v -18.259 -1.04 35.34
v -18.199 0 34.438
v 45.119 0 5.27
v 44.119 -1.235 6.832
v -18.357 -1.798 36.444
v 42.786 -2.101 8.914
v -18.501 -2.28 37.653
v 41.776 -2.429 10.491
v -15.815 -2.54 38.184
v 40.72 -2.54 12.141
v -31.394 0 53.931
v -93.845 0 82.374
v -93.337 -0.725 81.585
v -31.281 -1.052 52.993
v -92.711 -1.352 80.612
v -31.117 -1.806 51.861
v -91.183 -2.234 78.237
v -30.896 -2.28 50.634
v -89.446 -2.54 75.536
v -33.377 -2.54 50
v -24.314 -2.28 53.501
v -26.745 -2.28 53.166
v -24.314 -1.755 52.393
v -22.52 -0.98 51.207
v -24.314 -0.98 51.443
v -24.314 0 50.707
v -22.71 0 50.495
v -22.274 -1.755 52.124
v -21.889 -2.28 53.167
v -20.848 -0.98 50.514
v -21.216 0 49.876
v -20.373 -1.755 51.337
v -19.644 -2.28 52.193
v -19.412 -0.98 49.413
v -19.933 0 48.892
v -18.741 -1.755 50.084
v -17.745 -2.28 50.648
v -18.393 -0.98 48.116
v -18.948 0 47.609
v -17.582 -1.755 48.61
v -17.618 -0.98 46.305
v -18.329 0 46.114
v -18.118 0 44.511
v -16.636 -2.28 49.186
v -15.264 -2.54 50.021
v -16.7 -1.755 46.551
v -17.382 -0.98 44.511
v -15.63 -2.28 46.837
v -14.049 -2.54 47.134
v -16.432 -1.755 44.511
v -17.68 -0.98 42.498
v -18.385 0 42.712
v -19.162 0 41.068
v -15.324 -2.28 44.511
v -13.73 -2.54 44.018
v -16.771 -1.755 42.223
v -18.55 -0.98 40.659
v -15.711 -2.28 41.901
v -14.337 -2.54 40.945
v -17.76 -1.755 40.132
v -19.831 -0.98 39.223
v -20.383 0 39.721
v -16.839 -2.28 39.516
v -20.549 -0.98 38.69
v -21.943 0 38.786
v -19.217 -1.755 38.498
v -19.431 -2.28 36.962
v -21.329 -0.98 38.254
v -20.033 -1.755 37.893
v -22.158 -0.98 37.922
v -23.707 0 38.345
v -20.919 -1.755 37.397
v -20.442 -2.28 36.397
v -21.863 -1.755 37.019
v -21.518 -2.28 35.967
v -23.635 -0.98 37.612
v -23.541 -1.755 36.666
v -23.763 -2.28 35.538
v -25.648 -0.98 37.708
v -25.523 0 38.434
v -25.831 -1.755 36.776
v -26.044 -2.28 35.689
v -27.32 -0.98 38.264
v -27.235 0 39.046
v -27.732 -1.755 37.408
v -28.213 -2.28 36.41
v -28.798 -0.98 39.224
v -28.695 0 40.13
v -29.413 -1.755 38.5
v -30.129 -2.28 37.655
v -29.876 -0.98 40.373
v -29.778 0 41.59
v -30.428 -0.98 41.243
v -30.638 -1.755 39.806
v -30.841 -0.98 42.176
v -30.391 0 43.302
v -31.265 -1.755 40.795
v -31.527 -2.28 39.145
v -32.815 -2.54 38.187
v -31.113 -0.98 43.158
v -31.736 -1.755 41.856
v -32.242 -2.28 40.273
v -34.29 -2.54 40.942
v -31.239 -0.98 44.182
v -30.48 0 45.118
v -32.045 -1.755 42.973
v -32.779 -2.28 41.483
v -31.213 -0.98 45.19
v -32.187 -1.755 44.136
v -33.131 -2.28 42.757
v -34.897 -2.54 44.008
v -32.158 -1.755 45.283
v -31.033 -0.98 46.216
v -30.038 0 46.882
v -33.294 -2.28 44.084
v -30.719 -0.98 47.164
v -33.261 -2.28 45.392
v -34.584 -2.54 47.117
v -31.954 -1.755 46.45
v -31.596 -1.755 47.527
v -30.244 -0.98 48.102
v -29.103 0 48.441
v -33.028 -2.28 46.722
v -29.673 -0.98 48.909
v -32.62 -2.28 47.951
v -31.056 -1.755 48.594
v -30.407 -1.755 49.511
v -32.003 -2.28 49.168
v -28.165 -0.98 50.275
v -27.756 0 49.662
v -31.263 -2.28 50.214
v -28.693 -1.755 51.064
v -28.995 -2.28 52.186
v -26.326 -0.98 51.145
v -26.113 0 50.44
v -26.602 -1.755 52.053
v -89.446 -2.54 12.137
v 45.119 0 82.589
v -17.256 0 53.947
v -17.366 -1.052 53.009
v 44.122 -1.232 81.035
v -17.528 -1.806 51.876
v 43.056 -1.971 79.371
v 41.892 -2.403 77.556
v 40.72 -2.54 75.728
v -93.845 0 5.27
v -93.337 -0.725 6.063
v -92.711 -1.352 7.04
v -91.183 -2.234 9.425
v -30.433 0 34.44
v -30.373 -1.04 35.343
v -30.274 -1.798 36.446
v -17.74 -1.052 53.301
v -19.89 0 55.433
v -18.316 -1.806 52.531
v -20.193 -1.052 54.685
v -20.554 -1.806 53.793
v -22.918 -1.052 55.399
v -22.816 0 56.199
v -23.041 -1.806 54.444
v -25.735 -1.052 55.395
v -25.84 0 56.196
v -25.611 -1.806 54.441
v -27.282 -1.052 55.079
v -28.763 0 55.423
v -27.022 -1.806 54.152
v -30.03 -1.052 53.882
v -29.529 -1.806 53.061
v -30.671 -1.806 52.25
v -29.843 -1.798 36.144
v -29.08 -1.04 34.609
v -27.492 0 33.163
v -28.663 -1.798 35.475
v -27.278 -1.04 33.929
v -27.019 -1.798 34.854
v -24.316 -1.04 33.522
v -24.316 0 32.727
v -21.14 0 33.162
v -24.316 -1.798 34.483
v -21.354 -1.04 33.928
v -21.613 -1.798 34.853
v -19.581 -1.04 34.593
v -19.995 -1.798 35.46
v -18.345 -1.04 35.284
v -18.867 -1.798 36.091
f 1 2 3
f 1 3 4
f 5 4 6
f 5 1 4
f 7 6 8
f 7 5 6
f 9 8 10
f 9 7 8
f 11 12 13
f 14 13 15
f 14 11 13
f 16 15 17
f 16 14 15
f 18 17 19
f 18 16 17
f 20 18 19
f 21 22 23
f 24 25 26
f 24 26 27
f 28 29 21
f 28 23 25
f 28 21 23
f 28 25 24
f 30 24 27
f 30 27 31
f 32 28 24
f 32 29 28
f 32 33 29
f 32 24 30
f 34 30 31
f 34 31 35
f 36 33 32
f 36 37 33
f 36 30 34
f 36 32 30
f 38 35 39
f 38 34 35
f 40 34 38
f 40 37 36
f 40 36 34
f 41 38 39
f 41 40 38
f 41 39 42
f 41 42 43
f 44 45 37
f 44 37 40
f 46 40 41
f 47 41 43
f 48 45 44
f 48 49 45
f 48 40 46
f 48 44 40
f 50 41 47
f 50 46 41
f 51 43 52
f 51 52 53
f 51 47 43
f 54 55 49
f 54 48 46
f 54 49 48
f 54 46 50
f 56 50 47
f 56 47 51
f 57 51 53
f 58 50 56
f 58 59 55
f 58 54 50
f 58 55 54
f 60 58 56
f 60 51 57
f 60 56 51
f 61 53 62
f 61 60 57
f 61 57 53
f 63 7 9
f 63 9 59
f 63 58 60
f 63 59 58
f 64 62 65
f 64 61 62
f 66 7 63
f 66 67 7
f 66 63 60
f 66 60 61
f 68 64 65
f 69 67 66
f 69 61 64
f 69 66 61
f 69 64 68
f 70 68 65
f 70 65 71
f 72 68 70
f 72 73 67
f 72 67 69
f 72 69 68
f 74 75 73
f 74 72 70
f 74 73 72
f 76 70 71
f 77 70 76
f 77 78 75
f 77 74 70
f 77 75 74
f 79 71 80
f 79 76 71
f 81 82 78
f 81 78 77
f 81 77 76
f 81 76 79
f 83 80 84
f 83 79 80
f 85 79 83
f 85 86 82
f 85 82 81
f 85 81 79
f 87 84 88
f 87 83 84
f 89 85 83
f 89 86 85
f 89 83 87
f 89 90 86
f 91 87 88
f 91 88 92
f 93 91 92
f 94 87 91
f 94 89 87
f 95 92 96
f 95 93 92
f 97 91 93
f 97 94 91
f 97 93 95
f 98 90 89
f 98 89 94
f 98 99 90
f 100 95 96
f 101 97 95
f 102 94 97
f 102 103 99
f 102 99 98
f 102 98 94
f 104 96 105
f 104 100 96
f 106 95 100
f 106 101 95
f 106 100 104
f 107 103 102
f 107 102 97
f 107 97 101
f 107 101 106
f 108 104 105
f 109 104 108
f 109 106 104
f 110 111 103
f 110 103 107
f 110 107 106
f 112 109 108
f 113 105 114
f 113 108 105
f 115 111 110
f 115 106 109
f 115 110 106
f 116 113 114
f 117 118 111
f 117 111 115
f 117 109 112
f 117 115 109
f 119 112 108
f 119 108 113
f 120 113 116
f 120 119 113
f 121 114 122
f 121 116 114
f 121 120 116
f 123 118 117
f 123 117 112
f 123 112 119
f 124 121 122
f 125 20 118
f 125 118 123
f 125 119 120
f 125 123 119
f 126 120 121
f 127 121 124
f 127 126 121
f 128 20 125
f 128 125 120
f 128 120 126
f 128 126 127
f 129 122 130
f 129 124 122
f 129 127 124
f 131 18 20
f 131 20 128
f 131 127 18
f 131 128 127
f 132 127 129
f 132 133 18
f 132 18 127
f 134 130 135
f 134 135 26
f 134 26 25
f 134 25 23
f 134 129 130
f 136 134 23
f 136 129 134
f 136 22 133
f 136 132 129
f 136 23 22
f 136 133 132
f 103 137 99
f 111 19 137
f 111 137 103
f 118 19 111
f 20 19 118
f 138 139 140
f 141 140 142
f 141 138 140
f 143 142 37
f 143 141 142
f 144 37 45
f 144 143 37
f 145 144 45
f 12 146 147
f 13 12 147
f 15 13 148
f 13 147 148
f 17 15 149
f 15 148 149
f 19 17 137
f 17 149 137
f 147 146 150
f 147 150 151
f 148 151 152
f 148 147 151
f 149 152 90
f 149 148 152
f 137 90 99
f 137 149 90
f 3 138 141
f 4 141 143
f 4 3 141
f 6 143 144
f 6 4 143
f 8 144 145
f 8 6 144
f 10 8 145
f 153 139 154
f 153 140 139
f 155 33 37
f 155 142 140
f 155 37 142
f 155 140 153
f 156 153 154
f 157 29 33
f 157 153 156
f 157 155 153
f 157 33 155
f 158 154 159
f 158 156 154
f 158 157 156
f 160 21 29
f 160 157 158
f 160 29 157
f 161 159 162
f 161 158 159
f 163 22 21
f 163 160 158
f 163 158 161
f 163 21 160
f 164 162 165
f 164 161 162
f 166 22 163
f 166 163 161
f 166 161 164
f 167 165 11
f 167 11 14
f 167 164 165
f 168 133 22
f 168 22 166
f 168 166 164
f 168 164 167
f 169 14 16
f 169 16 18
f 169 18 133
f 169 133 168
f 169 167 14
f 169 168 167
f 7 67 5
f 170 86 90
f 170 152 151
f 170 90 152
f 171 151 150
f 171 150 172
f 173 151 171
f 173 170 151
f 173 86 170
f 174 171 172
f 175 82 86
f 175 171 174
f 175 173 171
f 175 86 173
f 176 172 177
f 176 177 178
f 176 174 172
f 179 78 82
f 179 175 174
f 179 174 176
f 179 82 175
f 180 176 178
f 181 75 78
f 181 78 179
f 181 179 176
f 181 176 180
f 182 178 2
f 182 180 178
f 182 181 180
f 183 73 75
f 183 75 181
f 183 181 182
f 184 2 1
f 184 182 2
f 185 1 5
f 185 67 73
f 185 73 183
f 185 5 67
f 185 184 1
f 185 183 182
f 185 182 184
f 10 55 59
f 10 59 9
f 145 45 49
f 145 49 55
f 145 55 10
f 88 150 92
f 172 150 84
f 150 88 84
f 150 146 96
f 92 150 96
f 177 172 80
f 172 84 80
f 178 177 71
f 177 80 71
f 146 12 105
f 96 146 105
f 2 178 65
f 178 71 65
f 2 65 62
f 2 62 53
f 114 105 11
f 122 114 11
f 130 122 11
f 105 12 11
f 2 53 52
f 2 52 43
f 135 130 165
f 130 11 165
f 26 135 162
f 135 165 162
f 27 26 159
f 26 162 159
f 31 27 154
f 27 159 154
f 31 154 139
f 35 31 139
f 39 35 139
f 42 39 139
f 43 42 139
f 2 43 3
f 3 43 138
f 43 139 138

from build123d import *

# Parameters (mm, degrees)
F1_DEPTH     = 2.54
F2_T1_DEPTH  = 99.1010776341
F2_T3_DEPTH  = 99.3158813996
F2_T8_DEPTH  = 90.6208911446
F2_S9_R      = 11.7840069811
F2_T10_DEPTH = 49
F2_T14_DEPTH = 91.7966915257
F2_S15_R     = 11.7840069811
F2_T16_DEPTH = 49
F2_T20_ANGLE = 169.5184876271
F2_T26_ANGLE = 180.7013968541
F2_T32_DEPTH = 90.6339735213
F2_S33_R     = 11.7840069811
F2_T34_DEPTH = 49
F2_T38_DEPTH = 91.7098992775
F2_S39_R     = 11.7840069811
F2_T40_DEPTH = 49
F2_T47_DEPTH = 90.6208911446
F2_S48_R     = 11.7840069811
F2_T49_DEPTH = 49
F2_T52_ANGLE = 180.7013968541
F2_T60_DEPTH = 91.7966915257
F2_S61_R     = 11.7840069811
F2_T62_DEPTH = 49
F2_T65_ANGLE = 169.5184876271
F2_T73_ANGLE = 169.5184876271
F2_T78_DEPTH = 91.7098992775
F2_S79_R     = 11.7840069811
F2_T80_DEPTH = 49
F2_T86_DEPTH = 90.6339735213
F2_S87_R     = 11.7840069811
F2_T88_DEPTH = 49
F2_T91_ANGLE = 180.7013968541


# Not quite as in the source:
# - a fillet or chamfer that OpenCascade refuses, or shapes differently, is made with other operations: its cross-section is extruded or revolved along the edge and cut away or added


with BuildPart() as f1:
    # F0 (on Front) → F1 (new body)
    with BuildSketch(Plane.XZ):
        with BuildLine():
            Line((-31.3936966788, 53.9309575686), (-93.8453510125, 82.3742888697))
            Line((-93.8453510125, 82.3742888697), (-93.8453510125, 5.2702564917))
            Line((-93.8453510125, 5.2702564917), (-30.4330390113, 34.4399206311))
            ThreePointArc((-30.4330390113, 34.4399206311), (-36.0837561517, 43.9306053941), (-31.3936966788, 53.9309575686))
        make_face()
        with BuildLine():
            Line((-24.3140361377, 37.2546620127), (-30.4330390113, 34.4399206311))
            ThreePointArc((-30.4330390113, 34.4399206311), (-24.3162174043, 32.7266945746), (-18.1987619666, 34.4376560178))
            Line((-18.1987619666, 34.4376560178), (-24.3140361377, 37.2546620127))
        make_face()
        with BuildLine():
            ThreePointArc((-17.2562665131, 53.9473696458), (-24.3277161277, 56.2947003943), (-31.3936966788, 53.9309575686))
            Line((-31.3936966788, 53.9309575686), (-24.3140361377, 50.7065573118))
            Line((-24.3140361377, 50.7065573118), (-17.2562665131, 53.9473696458))
        make_face()
        with BuildLine():
            Line((-24.3140361377, 50.7065573118), (-31.3936966788, 53.9309575686))
            ThreePointArc((-31.3936966788, 53.9309575686), (-36.0837561517, 43.9306053941), (-30.4330390113, 34.4399206311))
            Line((-30.4330390113, 34.4399206311), (-24.3140361377, 37.2546620127))
            Line((-24.3140361377, 37.2546620127), (-18.1987619666, 34.4376560178))
            ThreePointArc((-18.1987619666, 34.4376560178), (-14.0445362947, 38.731411302), (-12.5300291567, 44.5107013538))
            ThreePointArc((-12.5300291567, 44.5107013538), (-13.7776319348, 49.7877276945), (-17.2562665131, 53.9473696458))
            Line((-17.2562665131, 53.9473696458), (-24.3140361377, 50.7065573118))
        make_face()
        with BuildLine():
            ThreePointArc((-18.1181801797, 44.5107013538), (-28.6951679009, 40.1295695906), (-24.3140361377, 50.7065573118))
            ThreePointArc((-24.3140361377, 50.7065573118), (-19.9329043745, 48.891833117), (-18.1181801797, 44.5107013538))
        make_face(mode=Mode.SUBTRACT)
        with BuildLine():
            Line((45.1190461185, 82.5890926352), (-17.2562665131, 53.9473696458))
            ThreePointArc((-17.2562665131, 53.9473696458), (-13.7776319348, 49.7877276945), (-12.5300291567, 44.5107013538))
            ThreePointArc((-12.5300291567, 44.5107013538), (-14.0445362947, 38.731411302), (-18.1987619666, 34.4376560178))
            Line((-18.1987619666, 34.4376560178), (45.1190461185, 5.2702564917))
            Line((45.1190461185, 5.2702564917), (45.1190461185, 82.5890926352))
        make_face()
    extrude(amount=F1_DEPTH)

    # F2: fillet of radius 5.08 on 9 edges, made by hand

    # F2_s2 → F2_t1 (cut)
    with BuildSketch(Plane.XY.offset(-5.7282661364)):
        with BuildLine():
            ThreePointArc((-93.8453510125, 0), (-91.9859419613, -1.8594090512), (-89.4459419613, -2.54))
            Line((-89.4459419613, -2.54), (-89.4459419613, -2.6416))
            Line((-89.4459419613, -2.6416), (-93.8453510125, -2.6416))
            Line((-93.8453510125, -2.6416), (-93.9469510125, -2.54))
            ThreePointArc((-93.9469510125, -2.54), (-93.9469510125, -1.27), (-93.9333391936, -0.0508))
            Line((-93.9333391936, -0.0508), (-93.8453510125, 0))
        make_face()
    extrude(amount=F2_T1_DEPTH, mode=Mode.SUBTRACT)

    # F2_s4 → F2_t3 (cut)
    with BuildSketch(Plane.XY.offset(-5.7282661364)):
        with BuildLine():
            ThreePointArc((45.1190461184, 0), (43.2596370672, -1.8594090512), (40.7196370672, -2.54))
            Line((40.7196370672, -2.54), (40.7196370672, -2.6416))
            Line((40.7196370672, -2.6416), (45.1190461185, -2.6416))
            Line((45.1190461185, -2.6416), (45.2206461185, -2.54))
            ThreePointArc((45.2206461185, -2.54), (45.2206461185, -1.27), (45.2070342995, -0.0508))
            Line((45.2070342995, -0.0508), (45.1190461184, 0))
        make_face()
    extrude(amount=F2_T3_DEPTH, mode=Mode.SUBTRACT)


with BuildPart() as f2_tool6:
    # F2_s7 → F2_t8 (new body)
    with BuildSketch(Plane(origin=(-36.3340032464, 0, 16.54816198), x_dir=(0, 1, 0), z_dir=(-0.9100576268, 0, 0.4144817437))):
        with BuildLine():
            ThreePointArc((0, -36.0681651183), (-1.8594090512, -34.2087560671), (-2.54, -31.6687560671))
            Line((-2.54, -31.6687560671), (-2.6416, -31.6687560671))
            Line((-2.6416, -31.6687560671), (-2.6416, -36.0681651183))
            Line((-2.6416, -36.0681651183), (-2.54, -36.1697651183))
            ThreePointArc((-2.54, -36.1697651183), (-1.27, -36.1697651183), (-0.0508, -36.1561532993))
            Line((-0.0508, -36.1561532993), (0, -36.0681651183))
        make_face()
    extrude(amount=F2_T8_DEPTH)

    # F2_s9 → F2_t10 (cut, symmetric)
    with BuildSketch(Plane.XZ.offset(1.3)):
        with Locations((-24.3140361377, 44.5107013538)):
            Circle(F2_S9_R)
    extrude(amount=F2_T10_DEPTH, both=True, mode=Mode.SUBTRACT)


with BuildPart() as f1_1:
    add(f1.part)

    # F2_t5: cut F2_tool6
    add(f2_tool6.part, mode=Mode.SUBTRACT)


with BuildPart() as f2_tool12:
    # F2_s13 → F2_t14 (new body)
    with BuildSketch(Plane(origin=(-85.4468499724, 0, -39.3055518212), x_dir=(0, 1, 0), z_dir=(0.9084904493, 0, 0.4179056155))):
        with BuildLine():
            ThreePointArc((0, 44.0064768695), (-1.8594090512, 45.8658859207), (-2.54, 48.4058859207))
            Line((-2.54, 48.4058859207), (-2.6416, 48.4058859207))
            Line((-2.6416, 48.4058859207), (-2.6416, 44.0064768695))
            Line((-2.6416, 44.0064768695), (-2.54, 43.9048768695))
            ThreePointArc((-2.54, 43.9048768695), (-1.27, 43.9048768695), (-0.0508, 43.9184886885))
            Line((-0.0508, 43.9184886885), (0, 44.0064768695))
        make_face()
    extrude(amount=F2_T14_DEPTH)

    # F2_s15 → F2_t16 (cut, symmetric)
    with BuildSketch(Plane.XZ.offset(1.3)):
        with Locations((-24.3140361377, 44.5107013538)):
            Circle(F2_S15_R)
    extrude(amount=F2_T16_DEPTH, both=True, mode=Mode.SUBTRACT)


with BuildPart() as f1_2:
    add(f1_1.part)

    # F2_t11: cut F2_tool12
    add(f2_tool12.part, mode=Mode.SUBTRACT)


with BuildPart() as f2_tool18:
    # F2_s19 → F2_t20 (revolve)
    with BuildSketch(Plane(origin=(-4.2425907564, 0, 46.3479960774), x_dir=(0, 1, 0), z_dir=(-0.0911566276, 0, 0.9958365675))):
        with BuildLine():
            ThreePointArc((0, 31.939367846), (-1.8594090512, 30.0799587948), (-2.54, 27.5399587948))
            Line((-2.54, 27.5399587948), (-2.6416, 27.5399587948))
            Line((-2.6416, 27.5399587948), (-2.6416, 31.939367846))
            Line((-2.6416, 31.939367846), (-2.54, 32.040967846))
            ThreePointArc((-2.54, 32.040967846), (-1.27, 32.040967846), (-0.0508, 32.027356027))
            Line((-0.0508, 32.027356027), (0, 31.939367846))
        make_face()
    revolve(axis=Axis((-24.3140361377, -2.54, 44.5107013538), (0, -1, 0)), revolution_arc=F2_T20_ANGLE)

    split(bisect_by=Plane(origin=(-18.3905538043, 0, 39.9794639438), x_dir=(0, 1, 0), z_dir=(0.4179056155, 0, -0.9084904493)), keep=Keep.TOP)

    split(bisect_by=Plane(origin=(9.9009901007, 0, 21.4934824919), x_dir=(0, 1, 0), z_dir=(-0.4183934216, 0, -0.9082658998)), keep=Keep.TOP)


with BuildPart() as f1_3:
    add(f1_2.part)

    # F2_t17: cut F2_tool18
    add(f2_tool18.part, mode=Mode.SUBTRACT)


with BuildPart() as f2_tool24:
    # F2_s25 → F2_t26 (revolve)
    with BuildSketch(Plane(origin=(0.2201689694, 0, 44.3890119894), x_dir=(0, 1, 0), z_dir=(-0.004959927, 0, -0.9999876995))):
        with BuildLine():
            ThreePointArc((0, -12.7504999131), (-1.8594090512, -14.6099089643), (-2.54, -17.1499089643))
            Line((-2.54, -17.1499089643), (-2.6416, -17.1499089643))
            Line((-2.6416, -17.1499089643), (-2.6416, -12.7504999131))
            Line((-2.6416, -12.7504999131), (-2.54, -12.6488999131))
            ThreePointArc((-2.54, -12.6488999131), (-1.27, -12.6488999131), (-0.0508, -12.6625117321))
            Line((-0.0508, -12.6625117321), (0, -12.7504999131))
        make_face()
    revolve(axis=Axis((-24.3140361377, -2.54, 44.5107013538), (0, -1, 0)), revolution_arc=F2_T26_ANGLE)

    split(bisect_by=Plane(origin=(14.9495959692, 0, 32.824108752), x_dir=(0, 1, 0), z_dir=(0.4144817437, 0, 0.9100576268)), keep=Keep.TOP)

    split(bisect_by=Plane(origin=(-23.4630512937, 0, 51.0973156286), x_dir=(0, 1, 0), z_dir=(-0.4172931935, 0, 0.9087719134)), keep=Keep.TOP)


with BuildPart() as f1_4:
    add(f1_3.part)

    # F2_t23: cut F2_tool24
    add(f2_tool24.part, mode=Mode.SUBTRACT)


with BuildPart() as f2_tool30:
    # F2_s31 → F2_t32 (new body)
    with BuildSketch(Plane(origin=(78.5772458658, 0, 36.0813856381), x_dir=(0, 1, 0), z_dir=(-0.9087719134, 0, -0.4172931935))):
        with BuildLine():
            ThreePointArc((0, -56.2267768991), (-1.8594090512, -54.3673678478), (-2.54, -51.8273678478))
            Line((-2.54, -51.8273678478), (-2.6416, -51.8273678478))
            Line((-2.6416, -51.8273678478), (-2.6416, -56.2267768991))
            Line((-2.6416, -56.2267768991), (-2.54, -56.3283768991))
            ThreePointArc((-2.54, -56.3283768991), (-1.27, -56.3283768991), (-0.0508, -56.3147650801))
            Line((-0.0508, -56.3147650801), (0, -56.2267768991))
        make_face()
    extrude(amount=F2_T32_DEPTH)

    # F2_s33 → F2_t34 (cut, symmetric)
    with BuildSketch(Plane.XZ.offset(1.3)):
        with Locations((-24.3140361377, 44.5107013538)):
            Circle(F2_S33_R)
    extrude(amount=F2_T34_DEPTH, both=True, mode=Mode.SUBTRACT)


with BuildPart() as f1_5:
    add(f1_4.part)

    # F2_t29: cut F2_tool30
    add(f2_tool30.part, mode=Mode.SUBTRACT)


with BuildPart() as f2_tool36:
    # F2_s37 → F2_t38 (new body)
    with BuildSketch(Plane(origin=(-38.0893351185, 0, 17.5458830412), x_dir=(0, 1, 0), z_dir=(0.9082658998, 0, -0.4183934216))):
        with BuildLine():
            ThreePointArc((0, 23.6643063411), (-1.8594090512, 25.5237153923), (-2.54, 28.0637153923))
            Line((-2.54, 28.0637153923), (-2.6416, 28.0637153923))
            Line((-2.6416, 28.0637153923), (-2.6416, 23.6643063411))
            Line((-2.6416, 23.6643063411), (-2.54, 23.5627063411))
            ThreePointArc((-2.54, 23.5627063411), (-1.27, 23.5627063411), (-0.0508, 23.57631816))
            Line((-0.0508, 23.57631816), (0, 23.6643063411))
        make_face()
    extrude(amount=F2_T38_DEPTH)

    # F2_s39 → F2_t40 (cut, symmetric)
    with BuildSketch(Plane.XZ.offset(1.3)):
        with Locations((-24.3140361377, 44.5107013538)):
            Circle(F2_S39_R)
    extrude(amount=F2_T40_DEPTH, both=True, mode=Mode.SUBTRACT)


with BuildPart() as f1_6:
    add(f1_5.part)

    # F2_t35: cut F2_tool36
    add(f2_tool36.part, mode=Mode.SUBTRACT)

    # F2_s41 → F2_t42 (revolve, cut)
    with BuildSketch(Plane.YZ.offset(-24.3140361377)):
        with BuildLine():
            ThreePointArc((0, 50.7065573118), (-1.8594090512, 52.565966363), (-2.54, 55.105966363))
            Line((-2.54, 55.105966363), (-2.6416, 55.105966363))
            Line((-2.6416, 55.105966363), (-2.6416, 50.7065573118))
            Line((-2.6416, 50.7065573118), (-2.54, 50.6049573118))
            ThreePointArc((-2.54, 50.6049573118), (-1.27, 50.6049573118), (-0.0508, 50.6185691308))
            Line((-0.0508, 50.6185691308), (0, 50.7065573118))
        make_face()
    revolve(axis=Axis((-24.3140361377, -2.54, 44.5107013538), (0, 1, 0)), mode=Mode.SUBTRACT)


with BuildPart() as f2_tool45:
    # F2_s46 → F2_t47 (new body)
    with BuildSketch(Plane(origin=(-36.3340032464, 0, 16.54816198), x_dir=(0, 1, 0), z_dir=(-0.9100576268, 0, 0.4144817437))):
        with BuildLine():
            ThreePointArc((0, -36.0681651183), (-1.8594090512, -34.2087560671), (-2.54, -31.6687560671))
            Line((-2.54, -31.6687560671), (-2.6416, -31.6687560671))
            Line((-2.6416, -31.6687560671), (-2.6416, -36.0681651183))
            Line((-2.6416, -36.0681651183), (-2.54, -36.1697651183))
            ThreePointArc((-2.54, -36.1697651183), (-1.27, -36.1697651183), (-0.0508, -36.1561532993))
            Line((-0.0508, -36.1561532993), (0, -36.0681651183))
        make_face()
    extrude(amount=F2_T47_DEPTH)

    # F2_s48 → F2_t49 (intersect, symmetric)
    with BuildSketch(Plane.XZ.offset(1.3)):
        with Locations((-24.3140361377, 44.5107013538)):
            Circle(F2_S48_R)
    extrude(amount=F2_T49_DEPTH, both=True, mode=Mode.INTERSECT)


with BuildPart() as f2_tool50:
    # F2_s51 → F2_t52 (revolve)
    with BuildSketch(Plane(origin=(0.2201689694, 0, 44.3890119894), x_dir=(0, 1, 0), z_dir=(-0.004959927, 0, -0.9999876995))):
        with BuildLine():
            ThreePointArc((0, -12.7504999131), (-1.8594090512, -14.6099089643), (-2.54, -17.1499089643))
            Line((-2.54, -17.1499089643), (-2.6416, -17.1499089643))
            Line((-2.6416, -17.1499089643), (-2.6416, -12.7504999131))
            Line((-2.6416, -12.7504999131), (-2.54, -12.6488999131))
            ThreePointArc((-2.54, -12.6488999131), (-1.27, -12.6488999131), (-0.0508, -12.6625117321))
            Line((-0.0508, -12.6625117321), (0, -12.7504999131))
        make_face()
    revolve(axis=Axis((-24.3140361377, -2.54, 44.5107013538), (0, -1, 0)), revolution_arc=F2_T52_ANGLE)

    split(bisect_by=Plane(origin=(14.9495959692, 0, 32.824108752), x_dir=(0, 1, 0), z_dir=(-0.4144817437, 0, -0.9100576268)), keep=Keep.TOP)

    split(bisect_by=Plane(origin=(-23.4630512937, 0, 51.0973156286), x_dir=(0, 1, 0), z_dir=(-0.4172931935, 0, 0.9087719134)), keep=Keep.TOP)


with BuildPart() as f2_tool45_1:
    add(f2_tool45.part)

    # F2_t55: intersect F2_tool50
    add(f2_tool50.part, mode=Mode.INTERSECT)


with BuildPart() as f1_7:
    add(f1_6.part)

    # F2_t43: cut F2_tool45
    add(f2_tool45_1.part, mode=Mode.SUBTRACT)


with BuildPart() as f2_tool58:
    # F2_s59 → F2_t60 (new body)
    with BuildSketch(Plane(origin=(-85.4468499724, 0, -39.3055518212), x_dir=(0, 1, 0), z_dir=(0.9084904493, 0, 0.4179056155))):
        with BuildLine():
            ThreePointArc((0, 44.0064768695), (-1.8594090512, 45.8658859207), (-2.54, 48.4058859207))
            Line((-2.54, 48.4058859207), (-2.6416, 48.4058859207))
            Line((-2.6416, 48.4058859207), (-2.6416, 44.0064768695))
            Line((-2.6416, 44.0064768695), (-2.54, 43.9048768695))
            ThreePointArc((-2.54, 43.9048768695), (-1.27, 43.9048768695), (-0.0508, 43.9184886885))
            Line((-0.0508, 43.9184886885), (0, 44.0064768695))
        make_face()
    extrude(amount=F2_T60_DEPTH)

    # F2_s61 → F2_t62 (intersect, symmetric)
    with BuildSketch(Plane.XZ.offset(1.3)):
        with Locations((-24.3140361377, 44.5107013538)):
            Circle(F2_S61_R)
    extrude(amount=F2_T62_DEPTH, both=True, mode=Mode.INTERSECT)


with BuildPart() as f2_tool63:
    # F2_s64 → F2_t65 (revolve)
    with BuildSketch(Plane(origin=(-4.2425907564, 0, 46.3479960774), x_dir=(0, 1, 0), z_dir=(-0.0911566276, 0, 0.9958365675))):
        with BuildLine():
            ThreePointArc((0, 31.939367846), (-1.8594090512, 30.0799587948), (-2.54, 27.5399587948))
            Line((-2.54, 27.5399587948), (-2.6416, 27.5399587948))
            Line((-2.6416, 27.5399587948), (-2.6416, 31.939367846))
            Line((-2.6416, 31.939367846), (-2.54, 32.040967846))
            ThreePointArc((-2.54, 32.040967846), (-1.27, 32.040967846), (-0.0508, 32.027356027))
            Line((-0.0508, 32.027356027), (0, 31.939367846))
        make_face()
    revolve(axis=Axis((-24.3140361377, -2.54, 44.5107013538), (0, -1, 0)), revolution_arc=F2_T65_ANGLE)

    split(bisect_by=Plane(origin=(-18.3905538043, 0, 39.9794639438), x_dir=(0, 1, 0), z_dir=(-0.4179056155, 0, 0.9084904493)), keep=Keep.TOP)

    split(bisect_by=Plane(origin=(9.9009901007, 0, 21.4934824919), x_dir=(0, 1, 0), z_dir=(-0.4183934216, 0, -0.9082658998)), keep=Keep.TOP)


with BuildPart() as f2_tool58_1:
    add(f2_tool58.part)

    # F2_t68: intersect F2_tool63
    add(f2_tool63.part, mode=Mode.INTERSECT)


with BuildPart() as f1_8:
    add(f1_7.part)

    # F2_t56: cut F2_tool58
    add(f2_tool58_1.part, mode=Mode.SUBTRACT)


with BuildPart() as f2_tool71:
    # F2_s72 → F2_t73 (revolve)
    with BuildSketch(Plane(origin=(-4.2425907564, 0, 46.3479960774), x_dir=(0, 1, 0), z_dir=(-0.0911566276, 0, 0.9958365675))):
        with BuildLine():
            ThreePointArc((0, 31.939367846), (-1.8594090512, 30.0799587948), (-2.54, 27.5399587948))
            Line((-2.54, 27.5399587948), (-2.6416, 27.5399587948))
            Line((-2.6416, 27.5399587948), (-2.6416, 31.939367846))
            Line((-2.6416, 31.939367846), (-2.54, 32.040967846))
            ThreePointArc((-2.54, 32.040967846), (-1.27, 32.040967846), (-0.0508, 32.027356027))
            Line((-0.0508, 32.027356027), (0, 31.939367846))
        make_face()
    revolve(axis=Axis((-24.3140361377, -2.54, 44.5107013538), (0, -1, 0)), revolution_arc=F2_T73_ANGLE)

    split(bisect_by=Plane(origin=(-18.3905538043, 0, 39.9794639438), x_dir=(0, 1, 0), z_dir=(0.4179056155, 0, -0.9084904493)), keep=Keep.TOP)

    split(bisect_by=Plane(origin=(9.9009901007, 0, 21.4934824919), x_dir=(0, 1, 0), z_dir=(0.4183934216, 0, 0.9082658998)), keep=Keep.TOP)


with BuildPart() as f2_tool76:
    # F2_s77 → F2_t78 (new body)
    with BuildSketch(Plane(origin=(-38.0893351185, 0, 17.5458830412), x_dir=(0, 1, 0), z_dir=(0.9082658998, 0, -0.4183934216))):
        with BuildLine():
            ThreePointArc((0, 23.6643063411), (-1.8594090512, 25.5237153923), (-2.54, 28.0637153923))
            Line((-2.54, 28.0637153923), (-2.6416, 28.0637153923))
            Line((-2.6416, 28.0637153923), (-2.6416, 23.6643063411))
            Line((-2.6416, 23.6643063411), (-2.54, 23.5627063411))
            ThreePointArc((-2.54, 23.5627063411), (-1.27, 23.5627063411), (-0.0508, 23.57631816))
            Line((-0.0508, 23.57631816), (0, 23.6643063411))
        make_face()
    extrude(amount=F2_T78_DEPTH)

    # F2_s79 → F2_t80 (intersect, symmetric)
    with BuildSketch(Plane.XZ.offset(1.3)):
        with Locations((-24.3140361377, 44.5107013538)):
            Circle(F2_S79_R)
    extrude(amount=F2_T80_DEPTH, both=True, mode=Mode.INTERSECT)


with BuildPart() as f2_tool71_1:
    add(f2_tool71.part)

    # F2_t81: intersect F2_tool76
    add(f2_tool76.part, mode=Mode.INTERSECT)


with BuildPart() as f1_9:
    add(f1_8.part)

    # F2_t69: cut F2_tool71
    add(f2_tool71_1.part, mode=Mode.SUBTRACT)


with BuildPart() as f2_tool84:
    # F2_s85 → F2_t86 (new body)
    with BuildSketch(Plane(origin=(78.5772458658, 0, 36.0813856381), x_dir=(0, 1, 0), z_dir=(-0.9087719134, 0, -0.4172931935))):
        with BuildLine():
            ThreePointArc((0, -56.2267768991), (-1.8594090512, -54.3673678478), (-2.54, -51.8273678478))
            Line((-2.54, -51.8273678478), (-2.6416, -51.8273678478))
            Line((-2.6416, -51.8273678478), (-2.6416, -56.2267768991))
            Line((-2.6416, -56.2267768991), (-2.54, -56.3283768991))
            ThreePointArc((-2.54, -56.3283768991), (-1.27, -56.3283768991), (-0.0508, -56.3147650801))
            Line((-0.0508, -56.3147650801), (0, -56.2267768991))
        make_face()
    extrude(amount=F2_T86_DEPTH)

    # F2_s87 → F2_t88 (intersect, symmetric)
    with BuildSketch(Plane.XZ.offset(1.3)):
        with Locations((-24.3140361377, 44.5107013538)):
            Circle(F2_S87_R)
    extrude(amount=F2_T88_DEPTH, both=True, mode=Mode.INTERSECT)


with BuildPart() as f2_tool89:
    # F2_s90 → F2_t91 (revolve)
    with BuildSketch(Plane(origin=(0.2201689694, 0, 44.3890119894), x_dir=(0, 1, 0), z_dir=(-0.004959927, 0, -0.9999876995))):
        with BuildLine():
            ThreePointArc((0, -12.7504999131), (-1.8594090512, -14.6099089643), (-2.54, -17.1499089643))
            Line((-2.54, -17.1499089643), (-2.6416, -17.1499089643))
            Line((-2.6416, -17.1499089643), (-2.6416, -12.7504999131))
            Line((-2.6416, -12.7504999131), (-2.54, -12.6488999131))
            ThreePointArc((-2.54, -12.6488999131), (-1.27, -12.6488999131), (-0.0508, -12.6625117321))
            Line((-0.0508, -12.6625117321), (0, -12.7504999131))
        make_face()
    revolve(axis=Axis((-24.3140361377, -2.54, 44.5107013538), (0, -1, 0)), revolution_arc=F2_T91_ANGLE)

    split(bisect_by=Plane(origin=(14.9495959692, 0, 32.824108752), x_dir=(0, 1, 0), z_dir=(0.4144817437, 0, 0.9100576268)), keep=Keep.TOP)

    split(bisect_by=Plane(origin=(-23.4630512937, 0, 51.0973156286), x_dir=(0, 1, 0), z_dir=(0.4172931935, 0, -0.9087719134)), keep=Keep.TOP)


with BuildPart() as f2_tool84_1:
    add(f2_tool84.part)

    # F2_t94: intersect F2_tool89
    add(f2_tool89.part, mode=Mode.INTERSECT)


with BuildPart() as f1_10:
    add(f1_9.part)

    # F2_t82: cut F2_tool84
    add(f2_tool84_1.part, mode=Mode.SUBTRACT)


solid = f1_10.part
